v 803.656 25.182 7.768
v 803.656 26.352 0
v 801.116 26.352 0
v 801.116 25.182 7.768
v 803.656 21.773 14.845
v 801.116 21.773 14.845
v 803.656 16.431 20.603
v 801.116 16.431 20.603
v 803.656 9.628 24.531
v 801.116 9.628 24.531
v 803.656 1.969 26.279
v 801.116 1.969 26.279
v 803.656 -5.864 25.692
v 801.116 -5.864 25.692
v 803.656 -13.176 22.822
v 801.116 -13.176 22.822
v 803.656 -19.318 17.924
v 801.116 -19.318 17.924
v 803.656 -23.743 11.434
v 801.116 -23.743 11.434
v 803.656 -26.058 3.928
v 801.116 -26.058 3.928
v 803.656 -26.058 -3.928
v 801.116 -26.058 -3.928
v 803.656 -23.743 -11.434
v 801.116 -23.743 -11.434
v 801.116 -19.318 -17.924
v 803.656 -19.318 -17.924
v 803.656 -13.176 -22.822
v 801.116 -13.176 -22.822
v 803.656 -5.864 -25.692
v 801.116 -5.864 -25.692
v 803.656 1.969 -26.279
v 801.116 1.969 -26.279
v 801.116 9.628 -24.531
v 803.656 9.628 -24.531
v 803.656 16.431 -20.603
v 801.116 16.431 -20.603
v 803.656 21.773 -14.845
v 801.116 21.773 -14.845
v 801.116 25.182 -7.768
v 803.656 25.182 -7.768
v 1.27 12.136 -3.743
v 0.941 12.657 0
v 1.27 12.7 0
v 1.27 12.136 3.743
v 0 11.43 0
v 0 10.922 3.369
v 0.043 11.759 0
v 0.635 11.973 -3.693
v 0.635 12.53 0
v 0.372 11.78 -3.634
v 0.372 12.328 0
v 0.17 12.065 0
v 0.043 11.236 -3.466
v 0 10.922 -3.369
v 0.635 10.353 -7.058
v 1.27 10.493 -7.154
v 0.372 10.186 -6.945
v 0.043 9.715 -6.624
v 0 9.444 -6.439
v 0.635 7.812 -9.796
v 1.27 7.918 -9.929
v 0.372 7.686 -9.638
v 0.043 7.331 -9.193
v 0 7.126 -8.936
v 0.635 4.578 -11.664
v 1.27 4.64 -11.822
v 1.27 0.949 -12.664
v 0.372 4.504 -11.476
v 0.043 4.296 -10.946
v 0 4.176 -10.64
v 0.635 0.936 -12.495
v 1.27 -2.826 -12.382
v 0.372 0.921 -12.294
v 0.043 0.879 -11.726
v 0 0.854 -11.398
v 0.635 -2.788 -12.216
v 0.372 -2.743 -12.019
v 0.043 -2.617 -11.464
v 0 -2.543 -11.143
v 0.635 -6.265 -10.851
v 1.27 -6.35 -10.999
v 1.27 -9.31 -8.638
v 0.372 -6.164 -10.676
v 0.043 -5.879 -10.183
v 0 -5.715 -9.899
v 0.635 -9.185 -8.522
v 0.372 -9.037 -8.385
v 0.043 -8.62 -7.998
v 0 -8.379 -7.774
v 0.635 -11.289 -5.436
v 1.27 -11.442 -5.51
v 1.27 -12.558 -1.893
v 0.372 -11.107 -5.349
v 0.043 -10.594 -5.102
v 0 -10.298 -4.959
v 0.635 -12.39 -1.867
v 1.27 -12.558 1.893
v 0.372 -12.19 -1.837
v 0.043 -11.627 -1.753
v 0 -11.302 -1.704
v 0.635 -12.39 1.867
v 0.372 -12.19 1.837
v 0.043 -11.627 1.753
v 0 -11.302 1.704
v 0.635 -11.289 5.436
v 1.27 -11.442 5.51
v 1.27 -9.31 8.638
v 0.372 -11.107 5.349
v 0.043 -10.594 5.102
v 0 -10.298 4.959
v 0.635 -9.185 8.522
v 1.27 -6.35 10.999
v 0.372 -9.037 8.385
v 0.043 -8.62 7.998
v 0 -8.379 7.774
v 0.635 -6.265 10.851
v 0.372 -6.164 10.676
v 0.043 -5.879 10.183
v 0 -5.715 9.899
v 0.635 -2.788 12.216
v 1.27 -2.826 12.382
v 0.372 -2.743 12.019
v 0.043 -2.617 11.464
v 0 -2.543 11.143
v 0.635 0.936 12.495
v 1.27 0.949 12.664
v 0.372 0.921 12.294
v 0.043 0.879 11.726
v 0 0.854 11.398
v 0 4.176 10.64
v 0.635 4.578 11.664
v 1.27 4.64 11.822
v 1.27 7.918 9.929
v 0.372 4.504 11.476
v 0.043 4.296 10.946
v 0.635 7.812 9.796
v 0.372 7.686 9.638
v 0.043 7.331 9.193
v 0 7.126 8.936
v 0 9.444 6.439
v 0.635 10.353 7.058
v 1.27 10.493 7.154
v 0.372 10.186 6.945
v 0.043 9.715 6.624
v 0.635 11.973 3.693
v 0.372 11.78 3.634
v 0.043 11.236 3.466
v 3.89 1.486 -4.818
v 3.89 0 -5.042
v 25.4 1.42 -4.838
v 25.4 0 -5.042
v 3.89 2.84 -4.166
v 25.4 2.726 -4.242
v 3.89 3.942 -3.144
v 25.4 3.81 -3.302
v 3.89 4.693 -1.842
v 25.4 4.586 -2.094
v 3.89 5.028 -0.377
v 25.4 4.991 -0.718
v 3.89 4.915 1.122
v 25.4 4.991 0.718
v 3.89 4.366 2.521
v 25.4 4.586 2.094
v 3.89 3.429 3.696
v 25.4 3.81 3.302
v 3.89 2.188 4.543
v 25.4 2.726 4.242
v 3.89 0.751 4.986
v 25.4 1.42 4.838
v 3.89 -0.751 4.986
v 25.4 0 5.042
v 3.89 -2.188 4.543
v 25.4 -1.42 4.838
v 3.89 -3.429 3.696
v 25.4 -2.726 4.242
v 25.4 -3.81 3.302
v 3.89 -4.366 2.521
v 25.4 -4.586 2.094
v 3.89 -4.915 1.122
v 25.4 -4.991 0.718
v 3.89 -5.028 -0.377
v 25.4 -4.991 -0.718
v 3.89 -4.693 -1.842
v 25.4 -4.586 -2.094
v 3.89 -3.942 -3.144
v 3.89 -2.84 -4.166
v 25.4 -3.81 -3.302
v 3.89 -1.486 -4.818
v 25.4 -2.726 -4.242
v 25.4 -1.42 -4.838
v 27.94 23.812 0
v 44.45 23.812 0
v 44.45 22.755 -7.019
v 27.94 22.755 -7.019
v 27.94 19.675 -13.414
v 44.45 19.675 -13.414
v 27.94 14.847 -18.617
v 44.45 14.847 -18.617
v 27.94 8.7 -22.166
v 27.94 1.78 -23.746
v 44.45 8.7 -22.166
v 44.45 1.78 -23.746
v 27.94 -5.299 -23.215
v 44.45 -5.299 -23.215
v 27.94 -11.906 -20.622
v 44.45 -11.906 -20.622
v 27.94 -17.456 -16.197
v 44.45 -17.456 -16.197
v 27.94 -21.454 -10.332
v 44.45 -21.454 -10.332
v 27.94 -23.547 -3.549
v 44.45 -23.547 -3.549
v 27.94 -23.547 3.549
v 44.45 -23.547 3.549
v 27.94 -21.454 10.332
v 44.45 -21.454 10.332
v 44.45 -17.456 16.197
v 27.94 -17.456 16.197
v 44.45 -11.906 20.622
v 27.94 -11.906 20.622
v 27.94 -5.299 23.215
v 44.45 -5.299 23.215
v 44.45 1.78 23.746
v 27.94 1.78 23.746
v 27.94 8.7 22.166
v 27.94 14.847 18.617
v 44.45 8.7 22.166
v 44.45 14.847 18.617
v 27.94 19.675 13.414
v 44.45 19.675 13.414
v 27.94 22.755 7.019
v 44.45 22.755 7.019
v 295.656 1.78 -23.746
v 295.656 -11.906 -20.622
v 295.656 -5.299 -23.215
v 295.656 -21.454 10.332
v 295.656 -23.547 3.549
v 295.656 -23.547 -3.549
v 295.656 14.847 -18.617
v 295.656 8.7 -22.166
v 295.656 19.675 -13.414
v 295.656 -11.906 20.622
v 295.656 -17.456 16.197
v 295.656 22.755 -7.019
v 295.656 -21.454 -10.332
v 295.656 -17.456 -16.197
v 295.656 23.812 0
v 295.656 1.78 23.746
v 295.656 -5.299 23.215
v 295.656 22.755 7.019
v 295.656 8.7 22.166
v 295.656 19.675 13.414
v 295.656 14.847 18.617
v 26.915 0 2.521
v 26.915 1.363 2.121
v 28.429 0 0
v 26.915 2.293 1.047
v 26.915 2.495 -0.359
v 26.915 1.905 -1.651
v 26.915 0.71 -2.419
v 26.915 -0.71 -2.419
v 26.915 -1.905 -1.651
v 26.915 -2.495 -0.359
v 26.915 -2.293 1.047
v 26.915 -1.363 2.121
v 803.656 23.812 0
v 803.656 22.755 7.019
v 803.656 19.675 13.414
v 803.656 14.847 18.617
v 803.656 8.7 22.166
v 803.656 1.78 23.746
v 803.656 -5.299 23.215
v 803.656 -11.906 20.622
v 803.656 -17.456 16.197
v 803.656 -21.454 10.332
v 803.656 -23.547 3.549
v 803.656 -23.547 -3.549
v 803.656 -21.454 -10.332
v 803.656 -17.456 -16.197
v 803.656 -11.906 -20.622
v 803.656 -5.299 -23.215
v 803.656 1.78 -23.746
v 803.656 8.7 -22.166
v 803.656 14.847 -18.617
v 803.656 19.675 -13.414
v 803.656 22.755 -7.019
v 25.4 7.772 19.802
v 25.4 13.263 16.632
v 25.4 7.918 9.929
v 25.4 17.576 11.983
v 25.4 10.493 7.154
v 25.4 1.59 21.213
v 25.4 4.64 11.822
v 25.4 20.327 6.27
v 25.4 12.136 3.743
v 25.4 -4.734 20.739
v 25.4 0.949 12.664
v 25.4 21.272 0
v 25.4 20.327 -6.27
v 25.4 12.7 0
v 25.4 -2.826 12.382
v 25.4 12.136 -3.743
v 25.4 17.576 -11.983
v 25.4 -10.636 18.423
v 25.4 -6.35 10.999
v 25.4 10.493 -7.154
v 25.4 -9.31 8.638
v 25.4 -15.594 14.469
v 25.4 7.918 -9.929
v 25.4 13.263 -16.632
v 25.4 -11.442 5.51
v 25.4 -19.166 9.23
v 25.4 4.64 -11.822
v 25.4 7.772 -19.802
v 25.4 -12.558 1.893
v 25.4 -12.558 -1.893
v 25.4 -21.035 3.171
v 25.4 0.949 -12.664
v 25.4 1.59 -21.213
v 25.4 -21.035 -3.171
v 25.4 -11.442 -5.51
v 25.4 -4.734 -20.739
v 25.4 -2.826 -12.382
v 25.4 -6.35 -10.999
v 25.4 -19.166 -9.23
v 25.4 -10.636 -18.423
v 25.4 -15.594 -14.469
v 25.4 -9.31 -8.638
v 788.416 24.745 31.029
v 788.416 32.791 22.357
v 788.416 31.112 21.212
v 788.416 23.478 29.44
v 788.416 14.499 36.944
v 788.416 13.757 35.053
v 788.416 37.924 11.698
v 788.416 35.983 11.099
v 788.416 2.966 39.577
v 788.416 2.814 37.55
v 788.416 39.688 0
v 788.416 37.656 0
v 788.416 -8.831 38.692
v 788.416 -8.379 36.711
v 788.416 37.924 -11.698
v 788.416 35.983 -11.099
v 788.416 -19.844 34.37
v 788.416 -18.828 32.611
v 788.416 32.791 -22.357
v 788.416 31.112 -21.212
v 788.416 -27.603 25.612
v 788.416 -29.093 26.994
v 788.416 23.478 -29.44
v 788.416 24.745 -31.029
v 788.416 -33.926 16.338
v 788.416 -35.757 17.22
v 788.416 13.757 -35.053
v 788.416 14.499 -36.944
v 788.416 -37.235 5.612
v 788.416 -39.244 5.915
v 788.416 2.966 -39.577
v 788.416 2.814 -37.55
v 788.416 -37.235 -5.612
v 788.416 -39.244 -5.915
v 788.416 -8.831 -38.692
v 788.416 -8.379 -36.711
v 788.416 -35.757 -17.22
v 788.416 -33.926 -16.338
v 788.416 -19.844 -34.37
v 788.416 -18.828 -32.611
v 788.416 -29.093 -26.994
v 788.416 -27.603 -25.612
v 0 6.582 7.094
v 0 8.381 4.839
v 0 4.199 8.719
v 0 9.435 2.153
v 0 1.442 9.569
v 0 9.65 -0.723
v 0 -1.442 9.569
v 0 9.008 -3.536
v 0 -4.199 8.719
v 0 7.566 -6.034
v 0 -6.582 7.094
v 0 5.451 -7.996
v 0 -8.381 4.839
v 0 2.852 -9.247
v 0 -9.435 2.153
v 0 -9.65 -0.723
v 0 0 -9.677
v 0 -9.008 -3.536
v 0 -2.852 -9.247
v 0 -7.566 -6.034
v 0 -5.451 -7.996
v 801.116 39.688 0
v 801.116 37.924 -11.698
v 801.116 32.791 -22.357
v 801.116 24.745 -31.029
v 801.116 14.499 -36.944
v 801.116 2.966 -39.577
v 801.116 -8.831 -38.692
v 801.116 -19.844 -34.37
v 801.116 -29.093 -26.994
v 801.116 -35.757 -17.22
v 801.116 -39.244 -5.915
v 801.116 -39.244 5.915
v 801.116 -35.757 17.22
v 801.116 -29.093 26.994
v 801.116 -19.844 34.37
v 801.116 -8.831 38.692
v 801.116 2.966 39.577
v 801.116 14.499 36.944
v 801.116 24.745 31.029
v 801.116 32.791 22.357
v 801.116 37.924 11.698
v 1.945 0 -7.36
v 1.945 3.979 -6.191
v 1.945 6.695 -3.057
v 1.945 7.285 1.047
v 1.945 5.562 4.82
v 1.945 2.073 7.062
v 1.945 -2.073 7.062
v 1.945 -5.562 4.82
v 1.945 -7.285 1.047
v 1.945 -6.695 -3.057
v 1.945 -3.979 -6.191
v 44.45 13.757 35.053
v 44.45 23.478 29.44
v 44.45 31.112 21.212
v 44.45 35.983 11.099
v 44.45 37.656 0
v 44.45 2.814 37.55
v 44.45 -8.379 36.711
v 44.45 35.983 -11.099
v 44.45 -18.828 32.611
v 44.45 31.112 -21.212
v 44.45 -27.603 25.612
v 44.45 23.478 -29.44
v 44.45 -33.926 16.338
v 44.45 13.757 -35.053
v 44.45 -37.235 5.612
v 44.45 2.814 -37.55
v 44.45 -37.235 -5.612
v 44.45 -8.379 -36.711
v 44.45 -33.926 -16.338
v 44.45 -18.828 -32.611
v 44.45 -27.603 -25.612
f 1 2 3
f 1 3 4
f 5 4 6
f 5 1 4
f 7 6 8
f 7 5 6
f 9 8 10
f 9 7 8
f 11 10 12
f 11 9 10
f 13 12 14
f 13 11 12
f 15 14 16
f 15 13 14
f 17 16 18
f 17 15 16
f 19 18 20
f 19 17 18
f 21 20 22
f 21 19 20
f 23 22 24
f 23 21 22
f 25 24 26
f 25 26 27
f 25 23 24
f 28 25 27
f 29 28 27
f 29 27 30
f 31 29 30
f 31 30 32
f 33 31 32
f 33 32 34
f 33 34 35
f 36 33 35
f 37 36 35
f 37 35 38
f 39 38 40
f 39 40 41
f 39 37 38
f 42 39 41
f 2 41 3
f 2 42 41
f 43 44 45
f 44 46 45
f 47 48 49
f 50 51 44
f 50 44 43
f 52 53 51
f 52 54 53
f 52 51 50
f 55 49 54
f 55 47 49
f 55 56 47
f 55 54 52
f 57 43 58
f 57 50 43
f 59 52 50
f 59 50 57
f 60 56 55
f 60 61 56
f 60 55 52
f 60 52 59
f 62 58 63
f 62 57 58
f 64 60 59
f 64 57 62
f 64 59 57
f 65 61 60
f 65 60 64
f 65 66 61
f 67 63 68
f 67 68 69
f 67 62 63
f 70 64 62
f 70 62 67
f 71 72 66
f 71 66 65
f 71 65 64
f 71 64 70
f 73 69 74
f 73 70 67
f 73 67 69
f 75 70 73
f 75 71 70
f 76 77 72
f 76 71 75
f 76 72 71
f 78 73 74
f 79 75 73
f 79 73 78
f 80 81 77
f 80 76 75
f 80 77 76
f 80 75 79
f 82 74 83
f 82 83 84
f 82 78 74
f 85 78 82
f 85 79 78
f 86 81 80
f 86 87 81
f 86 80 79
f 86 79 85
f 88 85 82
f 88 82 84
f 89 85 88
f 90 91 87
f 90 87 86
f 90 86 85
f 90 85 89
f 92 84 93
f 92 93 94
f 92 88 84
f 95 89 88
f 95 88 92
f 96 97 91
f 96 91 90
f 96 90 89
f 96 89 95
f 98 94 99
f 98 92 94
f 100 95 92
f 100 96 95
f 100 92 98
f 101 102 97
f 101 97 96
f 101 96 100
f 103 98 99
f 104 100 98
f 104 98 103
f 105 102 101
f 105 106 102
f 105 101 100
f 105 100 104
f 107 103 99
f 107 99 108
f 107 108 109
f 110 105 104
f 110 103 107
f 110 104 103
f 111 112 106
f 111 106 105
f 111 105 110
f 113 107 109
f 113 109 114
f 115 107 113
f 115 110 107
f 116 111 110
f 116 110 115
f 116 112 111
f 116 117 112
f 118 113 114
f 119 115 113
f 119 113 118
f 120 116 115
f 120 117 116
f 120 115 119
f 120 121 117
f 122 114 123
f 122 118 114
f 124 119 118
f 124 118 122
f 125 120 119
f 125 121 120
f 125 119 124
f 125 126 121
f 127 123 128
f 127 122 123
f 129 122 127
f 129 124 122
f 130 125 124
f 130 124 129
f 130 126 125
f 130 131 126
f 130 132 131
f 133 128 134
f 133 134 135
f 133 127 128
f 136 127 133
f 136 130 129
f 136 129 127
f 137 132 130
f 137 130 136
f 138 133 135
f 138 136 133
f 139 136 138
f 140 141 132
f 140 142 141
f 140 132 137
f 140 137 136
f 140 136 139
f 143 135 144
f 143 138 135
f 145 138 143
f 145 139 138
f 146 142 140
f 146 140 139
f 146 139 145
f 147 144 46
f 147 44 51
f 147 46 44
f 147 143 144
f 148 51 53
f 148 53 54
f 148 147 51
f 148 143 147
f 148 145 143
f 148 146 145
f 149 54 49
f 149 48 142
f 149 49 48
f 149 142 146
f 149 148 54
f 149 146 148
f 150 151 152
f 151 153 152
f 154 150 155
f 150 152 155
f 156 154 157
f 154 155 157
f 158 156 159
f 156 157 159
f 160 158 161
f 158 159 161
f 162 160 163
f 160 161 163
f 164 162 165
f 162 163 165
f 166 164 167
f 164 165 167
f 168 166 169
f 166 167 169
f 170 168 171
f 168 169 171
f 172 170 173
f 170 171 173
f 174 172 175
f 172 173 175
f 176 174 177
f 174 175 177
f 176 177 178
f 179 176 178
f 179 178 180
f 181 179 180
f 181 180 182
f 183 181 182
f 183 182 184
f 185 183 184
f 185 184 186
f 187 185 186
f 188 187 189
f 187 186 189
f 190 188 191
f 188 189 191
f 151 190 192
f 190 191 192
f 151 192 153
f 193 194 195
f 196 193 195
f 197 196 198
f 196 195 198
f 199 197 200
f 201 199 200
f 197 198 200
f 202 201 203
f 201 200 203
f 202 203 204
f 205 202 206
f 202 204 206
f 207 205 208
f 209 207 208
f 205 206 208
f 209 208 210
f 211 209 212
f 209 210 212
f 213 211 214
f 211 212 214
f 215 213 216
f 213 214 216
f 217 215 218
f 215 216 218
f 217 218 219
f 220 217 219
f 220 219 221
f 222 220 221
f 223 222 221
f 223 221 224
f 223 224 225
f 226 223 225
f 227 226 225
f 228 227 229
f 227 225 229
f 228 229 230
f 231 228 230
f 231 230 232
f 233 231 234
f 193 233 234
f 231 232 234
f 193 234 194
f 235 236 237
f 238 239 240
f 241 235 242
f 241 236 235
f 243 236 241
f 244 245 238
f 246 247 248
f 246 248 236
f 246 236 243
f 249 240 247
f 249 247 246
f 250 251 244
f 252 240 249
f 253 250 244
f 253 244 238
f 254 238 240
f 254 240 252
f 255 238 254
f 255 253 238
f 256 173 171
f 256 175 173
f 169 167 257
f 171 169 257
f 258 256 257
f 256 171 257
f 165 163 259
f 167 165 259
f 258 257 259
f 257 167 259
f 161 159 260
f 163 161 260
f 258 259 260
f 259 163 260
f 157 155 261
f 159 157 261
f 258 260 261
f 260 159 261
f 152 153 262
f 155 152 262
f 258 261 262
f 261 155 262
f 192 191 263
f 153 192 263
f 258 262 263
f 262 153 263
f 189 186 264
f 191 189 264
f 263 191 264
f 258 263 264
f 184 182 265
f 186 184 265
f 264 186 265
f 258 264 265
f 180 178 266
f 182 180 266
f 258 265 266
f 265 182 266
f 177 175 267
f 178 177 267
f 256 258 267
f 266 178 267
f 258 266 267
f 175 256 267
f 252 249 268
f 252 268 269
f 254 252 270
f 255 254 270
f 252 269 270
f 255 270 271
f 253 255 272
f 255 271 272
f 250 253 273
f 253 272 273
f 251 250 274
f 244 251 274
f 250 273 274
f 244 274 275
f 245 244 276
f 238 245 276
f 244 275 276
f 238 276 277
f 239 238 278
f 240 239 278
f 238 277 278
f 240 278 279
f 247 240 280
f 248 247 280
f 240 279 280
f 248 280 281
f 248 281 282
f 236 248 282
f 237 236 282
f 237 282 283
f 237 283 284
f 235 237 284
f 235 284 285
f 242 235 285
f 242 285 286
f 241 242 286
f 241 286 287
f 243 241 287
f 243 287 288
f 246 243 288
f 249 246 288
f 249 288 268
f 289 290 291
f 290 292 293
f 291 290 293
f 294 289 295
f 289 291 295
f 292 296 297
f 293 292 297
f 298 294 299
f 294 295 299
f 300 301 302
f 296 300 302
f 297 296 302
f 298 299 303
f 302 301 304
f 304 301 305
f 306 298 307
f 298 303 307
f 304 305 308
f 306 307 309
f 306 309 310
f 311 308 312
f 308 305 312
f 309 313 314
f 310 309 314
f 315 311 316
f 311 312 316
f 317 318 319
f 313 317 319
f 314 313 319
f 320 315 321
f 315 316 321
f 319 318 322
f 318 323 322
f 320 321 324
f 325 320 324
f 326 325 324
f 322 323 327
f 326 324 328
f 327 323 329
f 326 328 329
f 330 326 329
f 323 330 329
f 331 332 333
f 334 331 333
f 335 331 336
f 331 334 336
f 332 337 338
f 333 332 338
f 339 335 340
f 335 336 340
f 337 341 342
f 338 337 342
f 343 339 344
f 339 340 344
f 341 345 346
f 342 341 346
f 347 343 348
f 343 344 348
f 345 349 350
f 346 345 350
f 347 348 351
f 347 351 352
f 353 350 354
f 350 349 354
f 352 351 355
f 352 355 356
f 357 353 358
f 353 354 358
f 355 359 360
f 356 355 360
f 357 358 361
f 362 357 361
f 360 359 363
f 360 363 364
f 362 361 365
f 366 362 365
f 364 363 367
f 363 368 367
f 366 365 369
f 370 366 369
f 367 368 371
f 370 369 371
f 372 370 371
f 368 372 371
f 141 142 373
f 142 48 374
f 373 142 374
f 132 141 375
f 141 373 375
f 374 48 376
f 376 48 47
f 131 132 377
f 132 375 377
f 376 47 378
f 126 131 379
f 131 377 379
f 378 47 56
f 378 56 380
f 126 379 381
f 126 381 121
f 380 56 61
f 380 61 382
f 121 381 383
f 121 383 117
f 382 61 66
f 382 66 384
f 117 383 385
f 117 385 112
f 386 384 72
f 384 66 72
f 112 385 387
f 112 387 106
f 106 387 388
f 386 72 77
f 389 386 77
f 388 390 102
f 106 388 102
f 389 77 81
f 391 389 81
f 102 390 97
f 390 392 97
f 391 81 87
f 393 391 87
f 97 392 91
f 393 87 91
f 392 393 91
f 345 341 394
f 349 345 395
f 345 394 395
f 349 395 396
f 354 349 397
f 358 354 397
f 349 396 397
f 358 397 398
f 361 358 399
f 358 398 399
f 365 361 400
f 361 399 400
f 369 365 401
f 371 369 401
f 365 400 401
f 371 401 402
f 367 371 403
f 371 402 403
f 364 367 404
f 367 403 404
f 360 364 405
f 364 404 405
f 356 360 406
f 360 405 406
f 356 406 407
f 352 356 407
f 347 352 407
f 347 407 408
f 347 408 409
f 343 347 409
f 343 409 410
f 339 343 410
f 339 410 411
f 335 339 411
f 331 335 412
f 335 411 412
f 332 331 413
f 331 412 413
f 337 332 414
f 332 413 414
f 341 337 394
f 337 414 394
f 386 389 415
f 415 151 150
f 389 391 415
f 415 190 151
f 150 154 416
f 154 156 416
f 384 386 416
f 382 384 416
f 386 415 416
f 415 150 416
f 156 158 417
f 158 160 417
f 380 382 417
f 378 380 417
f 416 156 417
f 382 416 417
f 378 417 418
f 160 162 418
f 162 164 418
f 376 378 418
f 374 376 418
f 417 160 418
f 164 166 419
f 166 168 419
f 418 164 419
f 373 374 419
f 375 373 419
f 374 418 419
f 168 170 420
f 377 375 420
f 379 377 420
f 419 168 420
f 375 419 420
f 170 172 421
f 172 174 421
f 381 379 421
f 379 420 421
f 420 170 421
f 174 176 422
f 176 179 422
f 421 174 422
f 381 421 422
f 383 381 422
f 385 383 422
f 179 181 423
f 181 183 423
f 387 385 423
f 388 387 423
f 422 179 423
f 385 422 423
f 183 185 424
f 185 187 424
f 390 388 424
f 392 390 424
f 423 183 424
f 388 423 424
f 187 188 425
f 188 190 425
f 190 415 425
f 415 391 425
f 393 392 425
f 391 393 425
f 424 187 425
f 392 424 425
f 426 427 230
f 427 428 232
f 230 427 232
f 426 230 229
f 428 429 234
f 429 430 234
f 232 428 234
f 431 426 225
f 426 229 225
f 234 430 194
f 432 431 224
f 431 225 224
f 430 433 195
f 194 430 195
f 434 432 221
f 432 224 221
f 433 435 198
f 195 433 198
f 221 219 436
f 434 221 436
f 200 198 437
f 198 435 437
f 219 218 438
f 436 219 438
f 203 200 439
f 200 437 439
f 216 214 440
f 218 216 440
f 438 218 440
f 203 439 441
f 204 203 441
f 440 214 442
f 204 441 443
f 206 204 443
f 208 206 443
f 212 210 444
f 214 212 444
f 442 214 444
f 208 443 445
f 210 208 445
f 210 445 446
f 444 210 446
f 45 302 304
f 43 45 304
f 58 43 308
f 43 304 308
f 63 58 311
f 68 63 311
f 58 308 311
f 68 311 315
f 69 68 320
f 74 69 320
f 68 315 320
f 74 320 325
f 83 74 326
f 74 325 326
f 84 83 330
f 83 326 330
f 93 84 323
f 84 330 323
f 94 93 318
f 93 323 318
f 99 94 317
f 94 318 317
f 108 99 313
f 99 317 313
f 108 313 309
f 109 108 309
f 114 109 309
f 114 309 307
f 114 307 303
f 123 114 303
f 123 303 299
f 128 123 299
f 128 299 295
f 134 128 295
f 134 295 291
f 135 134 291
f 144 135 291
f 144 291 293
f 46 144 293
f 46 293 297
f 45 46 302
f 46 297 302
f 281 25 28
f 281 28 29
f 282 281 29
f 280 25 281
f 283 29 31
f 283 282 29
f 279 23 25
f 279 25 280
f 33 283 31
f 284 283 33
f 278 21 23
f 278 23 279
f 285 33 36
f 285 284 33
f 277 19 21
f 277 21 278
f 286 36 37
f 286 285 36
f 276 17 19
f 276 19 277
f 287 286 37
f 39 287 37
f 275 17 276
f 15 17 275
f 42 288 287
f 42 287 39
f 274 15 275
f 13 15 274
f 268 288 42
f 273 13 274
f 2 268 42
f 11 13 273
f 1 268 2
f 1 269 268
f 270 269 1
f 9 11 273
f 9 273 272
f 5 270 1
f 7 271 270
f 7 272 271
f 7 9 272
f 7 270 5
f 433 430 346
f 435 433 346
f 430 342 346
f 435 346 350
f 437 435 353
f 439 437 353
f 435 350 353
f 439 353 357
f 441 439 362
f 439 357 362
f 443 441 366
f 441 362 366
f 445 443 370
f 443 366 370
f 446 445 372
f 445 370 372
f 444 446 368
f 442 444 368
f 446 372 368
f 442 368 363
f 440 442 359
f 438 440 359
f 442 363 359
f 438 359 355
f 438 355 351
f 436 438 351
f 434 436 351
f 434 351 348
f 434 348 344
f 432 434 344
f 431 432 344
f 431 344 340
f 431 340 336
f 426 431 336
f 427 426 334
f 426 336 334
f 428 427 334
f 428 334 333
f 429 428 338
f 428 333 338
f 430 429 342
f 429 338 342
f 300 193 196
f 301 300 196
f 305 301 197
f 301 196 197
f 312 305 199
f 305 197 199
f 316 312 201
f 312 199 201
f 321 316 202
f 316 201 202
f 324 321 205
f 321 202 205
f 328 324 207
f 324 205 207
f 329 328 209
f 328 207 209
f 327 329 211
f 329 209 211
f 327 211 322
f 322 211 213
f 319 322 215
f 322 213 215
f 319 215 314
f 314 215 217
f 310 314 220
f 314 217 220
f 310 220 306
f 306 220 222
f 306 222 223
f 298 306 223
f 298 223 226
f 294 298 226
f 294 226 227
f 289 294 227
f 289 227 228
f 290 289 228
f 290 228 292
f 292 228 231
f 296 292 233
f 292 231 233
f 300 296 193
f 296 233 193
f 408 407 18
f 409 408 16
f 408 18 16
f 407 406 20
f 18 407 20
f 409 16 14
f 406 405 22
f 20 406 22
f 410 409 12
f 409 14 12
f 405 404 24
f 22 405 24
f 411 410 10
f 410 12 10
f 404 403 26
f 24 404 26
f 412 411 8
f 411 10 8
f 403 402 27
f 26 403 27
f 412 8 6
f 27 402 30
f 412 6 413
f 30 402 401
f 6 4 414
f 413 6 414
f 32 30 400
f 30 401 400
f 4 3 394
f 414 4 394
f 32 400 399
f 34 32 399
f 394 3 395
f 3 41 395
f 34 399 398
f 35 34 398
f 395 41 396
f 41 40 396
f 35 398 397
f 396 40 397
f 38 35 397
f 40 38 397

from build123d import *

# Parameters (mm, degrees)
CHAMFER1_SIZE                                       = 2.54
CSK_FOR_3_8_FLAT_HEAD_MACHINE_SCREW_100_D           = 10.0838
CSK_FOR_3_8_FLAT_HEAD_MACHINE_SCREW_100_DEPTH       = 25.4
CSK_FOR_3_8_FLAT_HEAD_MACHINE_SCREW_100_CSINK_D     = 19.3548
CSK_FOR_3_8_FLAT_HEAD_MACHINE_SCREW_100_CSINK_ANGLE = 100
CSK_FOR_3_8_FLAT_HEAD_MACHINE_SCREW_100_TIP         = 3.029479155
FILLET2_R                                           = 1.27
BOSS_EXTRUDE1_START                                 = 2.54
SKETCH5_R                                           = 26.3525
SKETCH5_R_2                                         = 23.8125
BOSS_EXTRUDE1_DEPTH                                 = 2.54
SKETCH6_R                                           = 23.8125
CUT_EXTRUDE1_DEPTH                                  = 508


with BuildPart() as part:
    # Sketch1 → Revolve1 (revolve)
    with BuildSketch(Plane.XY):
        Polygon((0, 0), (0, 12.7), (25.4, 12.7), (25.4, 23.8125), (44.45, 23.8125), (44.45, 37.6555), (788.416, 37.6555), (788.416, 39.6875), (801.116, 39.6875), (801.116, 0), align=None)
    revolve(axis=Axis((801.116, 0, 0), (-1, 0, 0)))

    # Chamfer1
    chamfer1_edges = [part.edges().sort_by_distance(p)[0] for p in [
        (25.4, -23.8125, 0),
    ]]
    chamfer(chamfer1_edges, length=CHAMFER1_SIZE)

    # CSK for 3/8 Flat Head Machine Screw (100)1
    with Locations(Plane.ZY):
        with Locations((0, 0)):
            CounterSinkHole(CSK_FOR_3_8_FLAT_HEAD_MACHINE_SCREW_100_D / 2, CSK_FOR_3_8_FLAT_HEAD_MACHINE_SCREW_100_CSINK_D / 2, depth=CSK_FOR_3_8_FLAT_HEAD_MACHINE_SCREW_100_DEPTH, counter_sink_angle=CSK_FOR_3_8_FLAT_HEAD_MACHINE_SCREW_100_CSINK_ANGLE)
            with Locations((0, 0, -(CSK_FOR_3_8_FLAT_HEAD_MACHINE_SCREW_100_DEPTH + CSK_FOR_3_8_FLAT_HEAD_MACHINE_SCREW_100_TIP / 2))):  # 118° drill point
                Cone(0, CSK_FOR_3_8_FLAT_HEAD_MACHINE_SCREW_100_D / 2, CSK_FOR_3_8_FLAT_HEAD_MACHINE_SCREW_100_TIP, mode=Mode.SUBTRACT)

    # Fillet2
    fillet2_edges = [part.edges().sort_by_distance(p)[0] for p in [
        (0, -12.7, 0),
    ]]
    fillet(fillet2_edges, radius=FILLET2_R)

    # Sketch5 → Boss-Extrude1 (add)
    with BuildSketch(Plane(origin=(801.116, 0, 0), x_dir=(0, 0, -1), z_dir=(1, 0, 0)).offset(BOSS_EXTRUDE1_START)):
        with Locations(Location((0, 0, 0), (0, 0, 90))):
            Circle(SKETCH5_R)
        with Locations(Location((0, 0, 0), (0, 0, 90))):
            Circle(SKETCH5_R_2, mode=Mode.SUBTRACT)
    extrude(amount=-BOSS_EXTRUDE1_DEPTH)

    # Sketch6 → Cut-Extrude1 (cut)
    with BuildSketch(Plane(origin=(803.656, 0, 0), x_dir=(0, 0, -1), z_dir=(1, 0, 0))):
        with Locations(Location((0, 0, 0), (0, 0, 90))):
            Circle(SKETCH6_R)
    extrude(amount=-CUT_EXTRUDE1_DEPTH, mode=Mode.SUBTRACT)


solid = part.part
